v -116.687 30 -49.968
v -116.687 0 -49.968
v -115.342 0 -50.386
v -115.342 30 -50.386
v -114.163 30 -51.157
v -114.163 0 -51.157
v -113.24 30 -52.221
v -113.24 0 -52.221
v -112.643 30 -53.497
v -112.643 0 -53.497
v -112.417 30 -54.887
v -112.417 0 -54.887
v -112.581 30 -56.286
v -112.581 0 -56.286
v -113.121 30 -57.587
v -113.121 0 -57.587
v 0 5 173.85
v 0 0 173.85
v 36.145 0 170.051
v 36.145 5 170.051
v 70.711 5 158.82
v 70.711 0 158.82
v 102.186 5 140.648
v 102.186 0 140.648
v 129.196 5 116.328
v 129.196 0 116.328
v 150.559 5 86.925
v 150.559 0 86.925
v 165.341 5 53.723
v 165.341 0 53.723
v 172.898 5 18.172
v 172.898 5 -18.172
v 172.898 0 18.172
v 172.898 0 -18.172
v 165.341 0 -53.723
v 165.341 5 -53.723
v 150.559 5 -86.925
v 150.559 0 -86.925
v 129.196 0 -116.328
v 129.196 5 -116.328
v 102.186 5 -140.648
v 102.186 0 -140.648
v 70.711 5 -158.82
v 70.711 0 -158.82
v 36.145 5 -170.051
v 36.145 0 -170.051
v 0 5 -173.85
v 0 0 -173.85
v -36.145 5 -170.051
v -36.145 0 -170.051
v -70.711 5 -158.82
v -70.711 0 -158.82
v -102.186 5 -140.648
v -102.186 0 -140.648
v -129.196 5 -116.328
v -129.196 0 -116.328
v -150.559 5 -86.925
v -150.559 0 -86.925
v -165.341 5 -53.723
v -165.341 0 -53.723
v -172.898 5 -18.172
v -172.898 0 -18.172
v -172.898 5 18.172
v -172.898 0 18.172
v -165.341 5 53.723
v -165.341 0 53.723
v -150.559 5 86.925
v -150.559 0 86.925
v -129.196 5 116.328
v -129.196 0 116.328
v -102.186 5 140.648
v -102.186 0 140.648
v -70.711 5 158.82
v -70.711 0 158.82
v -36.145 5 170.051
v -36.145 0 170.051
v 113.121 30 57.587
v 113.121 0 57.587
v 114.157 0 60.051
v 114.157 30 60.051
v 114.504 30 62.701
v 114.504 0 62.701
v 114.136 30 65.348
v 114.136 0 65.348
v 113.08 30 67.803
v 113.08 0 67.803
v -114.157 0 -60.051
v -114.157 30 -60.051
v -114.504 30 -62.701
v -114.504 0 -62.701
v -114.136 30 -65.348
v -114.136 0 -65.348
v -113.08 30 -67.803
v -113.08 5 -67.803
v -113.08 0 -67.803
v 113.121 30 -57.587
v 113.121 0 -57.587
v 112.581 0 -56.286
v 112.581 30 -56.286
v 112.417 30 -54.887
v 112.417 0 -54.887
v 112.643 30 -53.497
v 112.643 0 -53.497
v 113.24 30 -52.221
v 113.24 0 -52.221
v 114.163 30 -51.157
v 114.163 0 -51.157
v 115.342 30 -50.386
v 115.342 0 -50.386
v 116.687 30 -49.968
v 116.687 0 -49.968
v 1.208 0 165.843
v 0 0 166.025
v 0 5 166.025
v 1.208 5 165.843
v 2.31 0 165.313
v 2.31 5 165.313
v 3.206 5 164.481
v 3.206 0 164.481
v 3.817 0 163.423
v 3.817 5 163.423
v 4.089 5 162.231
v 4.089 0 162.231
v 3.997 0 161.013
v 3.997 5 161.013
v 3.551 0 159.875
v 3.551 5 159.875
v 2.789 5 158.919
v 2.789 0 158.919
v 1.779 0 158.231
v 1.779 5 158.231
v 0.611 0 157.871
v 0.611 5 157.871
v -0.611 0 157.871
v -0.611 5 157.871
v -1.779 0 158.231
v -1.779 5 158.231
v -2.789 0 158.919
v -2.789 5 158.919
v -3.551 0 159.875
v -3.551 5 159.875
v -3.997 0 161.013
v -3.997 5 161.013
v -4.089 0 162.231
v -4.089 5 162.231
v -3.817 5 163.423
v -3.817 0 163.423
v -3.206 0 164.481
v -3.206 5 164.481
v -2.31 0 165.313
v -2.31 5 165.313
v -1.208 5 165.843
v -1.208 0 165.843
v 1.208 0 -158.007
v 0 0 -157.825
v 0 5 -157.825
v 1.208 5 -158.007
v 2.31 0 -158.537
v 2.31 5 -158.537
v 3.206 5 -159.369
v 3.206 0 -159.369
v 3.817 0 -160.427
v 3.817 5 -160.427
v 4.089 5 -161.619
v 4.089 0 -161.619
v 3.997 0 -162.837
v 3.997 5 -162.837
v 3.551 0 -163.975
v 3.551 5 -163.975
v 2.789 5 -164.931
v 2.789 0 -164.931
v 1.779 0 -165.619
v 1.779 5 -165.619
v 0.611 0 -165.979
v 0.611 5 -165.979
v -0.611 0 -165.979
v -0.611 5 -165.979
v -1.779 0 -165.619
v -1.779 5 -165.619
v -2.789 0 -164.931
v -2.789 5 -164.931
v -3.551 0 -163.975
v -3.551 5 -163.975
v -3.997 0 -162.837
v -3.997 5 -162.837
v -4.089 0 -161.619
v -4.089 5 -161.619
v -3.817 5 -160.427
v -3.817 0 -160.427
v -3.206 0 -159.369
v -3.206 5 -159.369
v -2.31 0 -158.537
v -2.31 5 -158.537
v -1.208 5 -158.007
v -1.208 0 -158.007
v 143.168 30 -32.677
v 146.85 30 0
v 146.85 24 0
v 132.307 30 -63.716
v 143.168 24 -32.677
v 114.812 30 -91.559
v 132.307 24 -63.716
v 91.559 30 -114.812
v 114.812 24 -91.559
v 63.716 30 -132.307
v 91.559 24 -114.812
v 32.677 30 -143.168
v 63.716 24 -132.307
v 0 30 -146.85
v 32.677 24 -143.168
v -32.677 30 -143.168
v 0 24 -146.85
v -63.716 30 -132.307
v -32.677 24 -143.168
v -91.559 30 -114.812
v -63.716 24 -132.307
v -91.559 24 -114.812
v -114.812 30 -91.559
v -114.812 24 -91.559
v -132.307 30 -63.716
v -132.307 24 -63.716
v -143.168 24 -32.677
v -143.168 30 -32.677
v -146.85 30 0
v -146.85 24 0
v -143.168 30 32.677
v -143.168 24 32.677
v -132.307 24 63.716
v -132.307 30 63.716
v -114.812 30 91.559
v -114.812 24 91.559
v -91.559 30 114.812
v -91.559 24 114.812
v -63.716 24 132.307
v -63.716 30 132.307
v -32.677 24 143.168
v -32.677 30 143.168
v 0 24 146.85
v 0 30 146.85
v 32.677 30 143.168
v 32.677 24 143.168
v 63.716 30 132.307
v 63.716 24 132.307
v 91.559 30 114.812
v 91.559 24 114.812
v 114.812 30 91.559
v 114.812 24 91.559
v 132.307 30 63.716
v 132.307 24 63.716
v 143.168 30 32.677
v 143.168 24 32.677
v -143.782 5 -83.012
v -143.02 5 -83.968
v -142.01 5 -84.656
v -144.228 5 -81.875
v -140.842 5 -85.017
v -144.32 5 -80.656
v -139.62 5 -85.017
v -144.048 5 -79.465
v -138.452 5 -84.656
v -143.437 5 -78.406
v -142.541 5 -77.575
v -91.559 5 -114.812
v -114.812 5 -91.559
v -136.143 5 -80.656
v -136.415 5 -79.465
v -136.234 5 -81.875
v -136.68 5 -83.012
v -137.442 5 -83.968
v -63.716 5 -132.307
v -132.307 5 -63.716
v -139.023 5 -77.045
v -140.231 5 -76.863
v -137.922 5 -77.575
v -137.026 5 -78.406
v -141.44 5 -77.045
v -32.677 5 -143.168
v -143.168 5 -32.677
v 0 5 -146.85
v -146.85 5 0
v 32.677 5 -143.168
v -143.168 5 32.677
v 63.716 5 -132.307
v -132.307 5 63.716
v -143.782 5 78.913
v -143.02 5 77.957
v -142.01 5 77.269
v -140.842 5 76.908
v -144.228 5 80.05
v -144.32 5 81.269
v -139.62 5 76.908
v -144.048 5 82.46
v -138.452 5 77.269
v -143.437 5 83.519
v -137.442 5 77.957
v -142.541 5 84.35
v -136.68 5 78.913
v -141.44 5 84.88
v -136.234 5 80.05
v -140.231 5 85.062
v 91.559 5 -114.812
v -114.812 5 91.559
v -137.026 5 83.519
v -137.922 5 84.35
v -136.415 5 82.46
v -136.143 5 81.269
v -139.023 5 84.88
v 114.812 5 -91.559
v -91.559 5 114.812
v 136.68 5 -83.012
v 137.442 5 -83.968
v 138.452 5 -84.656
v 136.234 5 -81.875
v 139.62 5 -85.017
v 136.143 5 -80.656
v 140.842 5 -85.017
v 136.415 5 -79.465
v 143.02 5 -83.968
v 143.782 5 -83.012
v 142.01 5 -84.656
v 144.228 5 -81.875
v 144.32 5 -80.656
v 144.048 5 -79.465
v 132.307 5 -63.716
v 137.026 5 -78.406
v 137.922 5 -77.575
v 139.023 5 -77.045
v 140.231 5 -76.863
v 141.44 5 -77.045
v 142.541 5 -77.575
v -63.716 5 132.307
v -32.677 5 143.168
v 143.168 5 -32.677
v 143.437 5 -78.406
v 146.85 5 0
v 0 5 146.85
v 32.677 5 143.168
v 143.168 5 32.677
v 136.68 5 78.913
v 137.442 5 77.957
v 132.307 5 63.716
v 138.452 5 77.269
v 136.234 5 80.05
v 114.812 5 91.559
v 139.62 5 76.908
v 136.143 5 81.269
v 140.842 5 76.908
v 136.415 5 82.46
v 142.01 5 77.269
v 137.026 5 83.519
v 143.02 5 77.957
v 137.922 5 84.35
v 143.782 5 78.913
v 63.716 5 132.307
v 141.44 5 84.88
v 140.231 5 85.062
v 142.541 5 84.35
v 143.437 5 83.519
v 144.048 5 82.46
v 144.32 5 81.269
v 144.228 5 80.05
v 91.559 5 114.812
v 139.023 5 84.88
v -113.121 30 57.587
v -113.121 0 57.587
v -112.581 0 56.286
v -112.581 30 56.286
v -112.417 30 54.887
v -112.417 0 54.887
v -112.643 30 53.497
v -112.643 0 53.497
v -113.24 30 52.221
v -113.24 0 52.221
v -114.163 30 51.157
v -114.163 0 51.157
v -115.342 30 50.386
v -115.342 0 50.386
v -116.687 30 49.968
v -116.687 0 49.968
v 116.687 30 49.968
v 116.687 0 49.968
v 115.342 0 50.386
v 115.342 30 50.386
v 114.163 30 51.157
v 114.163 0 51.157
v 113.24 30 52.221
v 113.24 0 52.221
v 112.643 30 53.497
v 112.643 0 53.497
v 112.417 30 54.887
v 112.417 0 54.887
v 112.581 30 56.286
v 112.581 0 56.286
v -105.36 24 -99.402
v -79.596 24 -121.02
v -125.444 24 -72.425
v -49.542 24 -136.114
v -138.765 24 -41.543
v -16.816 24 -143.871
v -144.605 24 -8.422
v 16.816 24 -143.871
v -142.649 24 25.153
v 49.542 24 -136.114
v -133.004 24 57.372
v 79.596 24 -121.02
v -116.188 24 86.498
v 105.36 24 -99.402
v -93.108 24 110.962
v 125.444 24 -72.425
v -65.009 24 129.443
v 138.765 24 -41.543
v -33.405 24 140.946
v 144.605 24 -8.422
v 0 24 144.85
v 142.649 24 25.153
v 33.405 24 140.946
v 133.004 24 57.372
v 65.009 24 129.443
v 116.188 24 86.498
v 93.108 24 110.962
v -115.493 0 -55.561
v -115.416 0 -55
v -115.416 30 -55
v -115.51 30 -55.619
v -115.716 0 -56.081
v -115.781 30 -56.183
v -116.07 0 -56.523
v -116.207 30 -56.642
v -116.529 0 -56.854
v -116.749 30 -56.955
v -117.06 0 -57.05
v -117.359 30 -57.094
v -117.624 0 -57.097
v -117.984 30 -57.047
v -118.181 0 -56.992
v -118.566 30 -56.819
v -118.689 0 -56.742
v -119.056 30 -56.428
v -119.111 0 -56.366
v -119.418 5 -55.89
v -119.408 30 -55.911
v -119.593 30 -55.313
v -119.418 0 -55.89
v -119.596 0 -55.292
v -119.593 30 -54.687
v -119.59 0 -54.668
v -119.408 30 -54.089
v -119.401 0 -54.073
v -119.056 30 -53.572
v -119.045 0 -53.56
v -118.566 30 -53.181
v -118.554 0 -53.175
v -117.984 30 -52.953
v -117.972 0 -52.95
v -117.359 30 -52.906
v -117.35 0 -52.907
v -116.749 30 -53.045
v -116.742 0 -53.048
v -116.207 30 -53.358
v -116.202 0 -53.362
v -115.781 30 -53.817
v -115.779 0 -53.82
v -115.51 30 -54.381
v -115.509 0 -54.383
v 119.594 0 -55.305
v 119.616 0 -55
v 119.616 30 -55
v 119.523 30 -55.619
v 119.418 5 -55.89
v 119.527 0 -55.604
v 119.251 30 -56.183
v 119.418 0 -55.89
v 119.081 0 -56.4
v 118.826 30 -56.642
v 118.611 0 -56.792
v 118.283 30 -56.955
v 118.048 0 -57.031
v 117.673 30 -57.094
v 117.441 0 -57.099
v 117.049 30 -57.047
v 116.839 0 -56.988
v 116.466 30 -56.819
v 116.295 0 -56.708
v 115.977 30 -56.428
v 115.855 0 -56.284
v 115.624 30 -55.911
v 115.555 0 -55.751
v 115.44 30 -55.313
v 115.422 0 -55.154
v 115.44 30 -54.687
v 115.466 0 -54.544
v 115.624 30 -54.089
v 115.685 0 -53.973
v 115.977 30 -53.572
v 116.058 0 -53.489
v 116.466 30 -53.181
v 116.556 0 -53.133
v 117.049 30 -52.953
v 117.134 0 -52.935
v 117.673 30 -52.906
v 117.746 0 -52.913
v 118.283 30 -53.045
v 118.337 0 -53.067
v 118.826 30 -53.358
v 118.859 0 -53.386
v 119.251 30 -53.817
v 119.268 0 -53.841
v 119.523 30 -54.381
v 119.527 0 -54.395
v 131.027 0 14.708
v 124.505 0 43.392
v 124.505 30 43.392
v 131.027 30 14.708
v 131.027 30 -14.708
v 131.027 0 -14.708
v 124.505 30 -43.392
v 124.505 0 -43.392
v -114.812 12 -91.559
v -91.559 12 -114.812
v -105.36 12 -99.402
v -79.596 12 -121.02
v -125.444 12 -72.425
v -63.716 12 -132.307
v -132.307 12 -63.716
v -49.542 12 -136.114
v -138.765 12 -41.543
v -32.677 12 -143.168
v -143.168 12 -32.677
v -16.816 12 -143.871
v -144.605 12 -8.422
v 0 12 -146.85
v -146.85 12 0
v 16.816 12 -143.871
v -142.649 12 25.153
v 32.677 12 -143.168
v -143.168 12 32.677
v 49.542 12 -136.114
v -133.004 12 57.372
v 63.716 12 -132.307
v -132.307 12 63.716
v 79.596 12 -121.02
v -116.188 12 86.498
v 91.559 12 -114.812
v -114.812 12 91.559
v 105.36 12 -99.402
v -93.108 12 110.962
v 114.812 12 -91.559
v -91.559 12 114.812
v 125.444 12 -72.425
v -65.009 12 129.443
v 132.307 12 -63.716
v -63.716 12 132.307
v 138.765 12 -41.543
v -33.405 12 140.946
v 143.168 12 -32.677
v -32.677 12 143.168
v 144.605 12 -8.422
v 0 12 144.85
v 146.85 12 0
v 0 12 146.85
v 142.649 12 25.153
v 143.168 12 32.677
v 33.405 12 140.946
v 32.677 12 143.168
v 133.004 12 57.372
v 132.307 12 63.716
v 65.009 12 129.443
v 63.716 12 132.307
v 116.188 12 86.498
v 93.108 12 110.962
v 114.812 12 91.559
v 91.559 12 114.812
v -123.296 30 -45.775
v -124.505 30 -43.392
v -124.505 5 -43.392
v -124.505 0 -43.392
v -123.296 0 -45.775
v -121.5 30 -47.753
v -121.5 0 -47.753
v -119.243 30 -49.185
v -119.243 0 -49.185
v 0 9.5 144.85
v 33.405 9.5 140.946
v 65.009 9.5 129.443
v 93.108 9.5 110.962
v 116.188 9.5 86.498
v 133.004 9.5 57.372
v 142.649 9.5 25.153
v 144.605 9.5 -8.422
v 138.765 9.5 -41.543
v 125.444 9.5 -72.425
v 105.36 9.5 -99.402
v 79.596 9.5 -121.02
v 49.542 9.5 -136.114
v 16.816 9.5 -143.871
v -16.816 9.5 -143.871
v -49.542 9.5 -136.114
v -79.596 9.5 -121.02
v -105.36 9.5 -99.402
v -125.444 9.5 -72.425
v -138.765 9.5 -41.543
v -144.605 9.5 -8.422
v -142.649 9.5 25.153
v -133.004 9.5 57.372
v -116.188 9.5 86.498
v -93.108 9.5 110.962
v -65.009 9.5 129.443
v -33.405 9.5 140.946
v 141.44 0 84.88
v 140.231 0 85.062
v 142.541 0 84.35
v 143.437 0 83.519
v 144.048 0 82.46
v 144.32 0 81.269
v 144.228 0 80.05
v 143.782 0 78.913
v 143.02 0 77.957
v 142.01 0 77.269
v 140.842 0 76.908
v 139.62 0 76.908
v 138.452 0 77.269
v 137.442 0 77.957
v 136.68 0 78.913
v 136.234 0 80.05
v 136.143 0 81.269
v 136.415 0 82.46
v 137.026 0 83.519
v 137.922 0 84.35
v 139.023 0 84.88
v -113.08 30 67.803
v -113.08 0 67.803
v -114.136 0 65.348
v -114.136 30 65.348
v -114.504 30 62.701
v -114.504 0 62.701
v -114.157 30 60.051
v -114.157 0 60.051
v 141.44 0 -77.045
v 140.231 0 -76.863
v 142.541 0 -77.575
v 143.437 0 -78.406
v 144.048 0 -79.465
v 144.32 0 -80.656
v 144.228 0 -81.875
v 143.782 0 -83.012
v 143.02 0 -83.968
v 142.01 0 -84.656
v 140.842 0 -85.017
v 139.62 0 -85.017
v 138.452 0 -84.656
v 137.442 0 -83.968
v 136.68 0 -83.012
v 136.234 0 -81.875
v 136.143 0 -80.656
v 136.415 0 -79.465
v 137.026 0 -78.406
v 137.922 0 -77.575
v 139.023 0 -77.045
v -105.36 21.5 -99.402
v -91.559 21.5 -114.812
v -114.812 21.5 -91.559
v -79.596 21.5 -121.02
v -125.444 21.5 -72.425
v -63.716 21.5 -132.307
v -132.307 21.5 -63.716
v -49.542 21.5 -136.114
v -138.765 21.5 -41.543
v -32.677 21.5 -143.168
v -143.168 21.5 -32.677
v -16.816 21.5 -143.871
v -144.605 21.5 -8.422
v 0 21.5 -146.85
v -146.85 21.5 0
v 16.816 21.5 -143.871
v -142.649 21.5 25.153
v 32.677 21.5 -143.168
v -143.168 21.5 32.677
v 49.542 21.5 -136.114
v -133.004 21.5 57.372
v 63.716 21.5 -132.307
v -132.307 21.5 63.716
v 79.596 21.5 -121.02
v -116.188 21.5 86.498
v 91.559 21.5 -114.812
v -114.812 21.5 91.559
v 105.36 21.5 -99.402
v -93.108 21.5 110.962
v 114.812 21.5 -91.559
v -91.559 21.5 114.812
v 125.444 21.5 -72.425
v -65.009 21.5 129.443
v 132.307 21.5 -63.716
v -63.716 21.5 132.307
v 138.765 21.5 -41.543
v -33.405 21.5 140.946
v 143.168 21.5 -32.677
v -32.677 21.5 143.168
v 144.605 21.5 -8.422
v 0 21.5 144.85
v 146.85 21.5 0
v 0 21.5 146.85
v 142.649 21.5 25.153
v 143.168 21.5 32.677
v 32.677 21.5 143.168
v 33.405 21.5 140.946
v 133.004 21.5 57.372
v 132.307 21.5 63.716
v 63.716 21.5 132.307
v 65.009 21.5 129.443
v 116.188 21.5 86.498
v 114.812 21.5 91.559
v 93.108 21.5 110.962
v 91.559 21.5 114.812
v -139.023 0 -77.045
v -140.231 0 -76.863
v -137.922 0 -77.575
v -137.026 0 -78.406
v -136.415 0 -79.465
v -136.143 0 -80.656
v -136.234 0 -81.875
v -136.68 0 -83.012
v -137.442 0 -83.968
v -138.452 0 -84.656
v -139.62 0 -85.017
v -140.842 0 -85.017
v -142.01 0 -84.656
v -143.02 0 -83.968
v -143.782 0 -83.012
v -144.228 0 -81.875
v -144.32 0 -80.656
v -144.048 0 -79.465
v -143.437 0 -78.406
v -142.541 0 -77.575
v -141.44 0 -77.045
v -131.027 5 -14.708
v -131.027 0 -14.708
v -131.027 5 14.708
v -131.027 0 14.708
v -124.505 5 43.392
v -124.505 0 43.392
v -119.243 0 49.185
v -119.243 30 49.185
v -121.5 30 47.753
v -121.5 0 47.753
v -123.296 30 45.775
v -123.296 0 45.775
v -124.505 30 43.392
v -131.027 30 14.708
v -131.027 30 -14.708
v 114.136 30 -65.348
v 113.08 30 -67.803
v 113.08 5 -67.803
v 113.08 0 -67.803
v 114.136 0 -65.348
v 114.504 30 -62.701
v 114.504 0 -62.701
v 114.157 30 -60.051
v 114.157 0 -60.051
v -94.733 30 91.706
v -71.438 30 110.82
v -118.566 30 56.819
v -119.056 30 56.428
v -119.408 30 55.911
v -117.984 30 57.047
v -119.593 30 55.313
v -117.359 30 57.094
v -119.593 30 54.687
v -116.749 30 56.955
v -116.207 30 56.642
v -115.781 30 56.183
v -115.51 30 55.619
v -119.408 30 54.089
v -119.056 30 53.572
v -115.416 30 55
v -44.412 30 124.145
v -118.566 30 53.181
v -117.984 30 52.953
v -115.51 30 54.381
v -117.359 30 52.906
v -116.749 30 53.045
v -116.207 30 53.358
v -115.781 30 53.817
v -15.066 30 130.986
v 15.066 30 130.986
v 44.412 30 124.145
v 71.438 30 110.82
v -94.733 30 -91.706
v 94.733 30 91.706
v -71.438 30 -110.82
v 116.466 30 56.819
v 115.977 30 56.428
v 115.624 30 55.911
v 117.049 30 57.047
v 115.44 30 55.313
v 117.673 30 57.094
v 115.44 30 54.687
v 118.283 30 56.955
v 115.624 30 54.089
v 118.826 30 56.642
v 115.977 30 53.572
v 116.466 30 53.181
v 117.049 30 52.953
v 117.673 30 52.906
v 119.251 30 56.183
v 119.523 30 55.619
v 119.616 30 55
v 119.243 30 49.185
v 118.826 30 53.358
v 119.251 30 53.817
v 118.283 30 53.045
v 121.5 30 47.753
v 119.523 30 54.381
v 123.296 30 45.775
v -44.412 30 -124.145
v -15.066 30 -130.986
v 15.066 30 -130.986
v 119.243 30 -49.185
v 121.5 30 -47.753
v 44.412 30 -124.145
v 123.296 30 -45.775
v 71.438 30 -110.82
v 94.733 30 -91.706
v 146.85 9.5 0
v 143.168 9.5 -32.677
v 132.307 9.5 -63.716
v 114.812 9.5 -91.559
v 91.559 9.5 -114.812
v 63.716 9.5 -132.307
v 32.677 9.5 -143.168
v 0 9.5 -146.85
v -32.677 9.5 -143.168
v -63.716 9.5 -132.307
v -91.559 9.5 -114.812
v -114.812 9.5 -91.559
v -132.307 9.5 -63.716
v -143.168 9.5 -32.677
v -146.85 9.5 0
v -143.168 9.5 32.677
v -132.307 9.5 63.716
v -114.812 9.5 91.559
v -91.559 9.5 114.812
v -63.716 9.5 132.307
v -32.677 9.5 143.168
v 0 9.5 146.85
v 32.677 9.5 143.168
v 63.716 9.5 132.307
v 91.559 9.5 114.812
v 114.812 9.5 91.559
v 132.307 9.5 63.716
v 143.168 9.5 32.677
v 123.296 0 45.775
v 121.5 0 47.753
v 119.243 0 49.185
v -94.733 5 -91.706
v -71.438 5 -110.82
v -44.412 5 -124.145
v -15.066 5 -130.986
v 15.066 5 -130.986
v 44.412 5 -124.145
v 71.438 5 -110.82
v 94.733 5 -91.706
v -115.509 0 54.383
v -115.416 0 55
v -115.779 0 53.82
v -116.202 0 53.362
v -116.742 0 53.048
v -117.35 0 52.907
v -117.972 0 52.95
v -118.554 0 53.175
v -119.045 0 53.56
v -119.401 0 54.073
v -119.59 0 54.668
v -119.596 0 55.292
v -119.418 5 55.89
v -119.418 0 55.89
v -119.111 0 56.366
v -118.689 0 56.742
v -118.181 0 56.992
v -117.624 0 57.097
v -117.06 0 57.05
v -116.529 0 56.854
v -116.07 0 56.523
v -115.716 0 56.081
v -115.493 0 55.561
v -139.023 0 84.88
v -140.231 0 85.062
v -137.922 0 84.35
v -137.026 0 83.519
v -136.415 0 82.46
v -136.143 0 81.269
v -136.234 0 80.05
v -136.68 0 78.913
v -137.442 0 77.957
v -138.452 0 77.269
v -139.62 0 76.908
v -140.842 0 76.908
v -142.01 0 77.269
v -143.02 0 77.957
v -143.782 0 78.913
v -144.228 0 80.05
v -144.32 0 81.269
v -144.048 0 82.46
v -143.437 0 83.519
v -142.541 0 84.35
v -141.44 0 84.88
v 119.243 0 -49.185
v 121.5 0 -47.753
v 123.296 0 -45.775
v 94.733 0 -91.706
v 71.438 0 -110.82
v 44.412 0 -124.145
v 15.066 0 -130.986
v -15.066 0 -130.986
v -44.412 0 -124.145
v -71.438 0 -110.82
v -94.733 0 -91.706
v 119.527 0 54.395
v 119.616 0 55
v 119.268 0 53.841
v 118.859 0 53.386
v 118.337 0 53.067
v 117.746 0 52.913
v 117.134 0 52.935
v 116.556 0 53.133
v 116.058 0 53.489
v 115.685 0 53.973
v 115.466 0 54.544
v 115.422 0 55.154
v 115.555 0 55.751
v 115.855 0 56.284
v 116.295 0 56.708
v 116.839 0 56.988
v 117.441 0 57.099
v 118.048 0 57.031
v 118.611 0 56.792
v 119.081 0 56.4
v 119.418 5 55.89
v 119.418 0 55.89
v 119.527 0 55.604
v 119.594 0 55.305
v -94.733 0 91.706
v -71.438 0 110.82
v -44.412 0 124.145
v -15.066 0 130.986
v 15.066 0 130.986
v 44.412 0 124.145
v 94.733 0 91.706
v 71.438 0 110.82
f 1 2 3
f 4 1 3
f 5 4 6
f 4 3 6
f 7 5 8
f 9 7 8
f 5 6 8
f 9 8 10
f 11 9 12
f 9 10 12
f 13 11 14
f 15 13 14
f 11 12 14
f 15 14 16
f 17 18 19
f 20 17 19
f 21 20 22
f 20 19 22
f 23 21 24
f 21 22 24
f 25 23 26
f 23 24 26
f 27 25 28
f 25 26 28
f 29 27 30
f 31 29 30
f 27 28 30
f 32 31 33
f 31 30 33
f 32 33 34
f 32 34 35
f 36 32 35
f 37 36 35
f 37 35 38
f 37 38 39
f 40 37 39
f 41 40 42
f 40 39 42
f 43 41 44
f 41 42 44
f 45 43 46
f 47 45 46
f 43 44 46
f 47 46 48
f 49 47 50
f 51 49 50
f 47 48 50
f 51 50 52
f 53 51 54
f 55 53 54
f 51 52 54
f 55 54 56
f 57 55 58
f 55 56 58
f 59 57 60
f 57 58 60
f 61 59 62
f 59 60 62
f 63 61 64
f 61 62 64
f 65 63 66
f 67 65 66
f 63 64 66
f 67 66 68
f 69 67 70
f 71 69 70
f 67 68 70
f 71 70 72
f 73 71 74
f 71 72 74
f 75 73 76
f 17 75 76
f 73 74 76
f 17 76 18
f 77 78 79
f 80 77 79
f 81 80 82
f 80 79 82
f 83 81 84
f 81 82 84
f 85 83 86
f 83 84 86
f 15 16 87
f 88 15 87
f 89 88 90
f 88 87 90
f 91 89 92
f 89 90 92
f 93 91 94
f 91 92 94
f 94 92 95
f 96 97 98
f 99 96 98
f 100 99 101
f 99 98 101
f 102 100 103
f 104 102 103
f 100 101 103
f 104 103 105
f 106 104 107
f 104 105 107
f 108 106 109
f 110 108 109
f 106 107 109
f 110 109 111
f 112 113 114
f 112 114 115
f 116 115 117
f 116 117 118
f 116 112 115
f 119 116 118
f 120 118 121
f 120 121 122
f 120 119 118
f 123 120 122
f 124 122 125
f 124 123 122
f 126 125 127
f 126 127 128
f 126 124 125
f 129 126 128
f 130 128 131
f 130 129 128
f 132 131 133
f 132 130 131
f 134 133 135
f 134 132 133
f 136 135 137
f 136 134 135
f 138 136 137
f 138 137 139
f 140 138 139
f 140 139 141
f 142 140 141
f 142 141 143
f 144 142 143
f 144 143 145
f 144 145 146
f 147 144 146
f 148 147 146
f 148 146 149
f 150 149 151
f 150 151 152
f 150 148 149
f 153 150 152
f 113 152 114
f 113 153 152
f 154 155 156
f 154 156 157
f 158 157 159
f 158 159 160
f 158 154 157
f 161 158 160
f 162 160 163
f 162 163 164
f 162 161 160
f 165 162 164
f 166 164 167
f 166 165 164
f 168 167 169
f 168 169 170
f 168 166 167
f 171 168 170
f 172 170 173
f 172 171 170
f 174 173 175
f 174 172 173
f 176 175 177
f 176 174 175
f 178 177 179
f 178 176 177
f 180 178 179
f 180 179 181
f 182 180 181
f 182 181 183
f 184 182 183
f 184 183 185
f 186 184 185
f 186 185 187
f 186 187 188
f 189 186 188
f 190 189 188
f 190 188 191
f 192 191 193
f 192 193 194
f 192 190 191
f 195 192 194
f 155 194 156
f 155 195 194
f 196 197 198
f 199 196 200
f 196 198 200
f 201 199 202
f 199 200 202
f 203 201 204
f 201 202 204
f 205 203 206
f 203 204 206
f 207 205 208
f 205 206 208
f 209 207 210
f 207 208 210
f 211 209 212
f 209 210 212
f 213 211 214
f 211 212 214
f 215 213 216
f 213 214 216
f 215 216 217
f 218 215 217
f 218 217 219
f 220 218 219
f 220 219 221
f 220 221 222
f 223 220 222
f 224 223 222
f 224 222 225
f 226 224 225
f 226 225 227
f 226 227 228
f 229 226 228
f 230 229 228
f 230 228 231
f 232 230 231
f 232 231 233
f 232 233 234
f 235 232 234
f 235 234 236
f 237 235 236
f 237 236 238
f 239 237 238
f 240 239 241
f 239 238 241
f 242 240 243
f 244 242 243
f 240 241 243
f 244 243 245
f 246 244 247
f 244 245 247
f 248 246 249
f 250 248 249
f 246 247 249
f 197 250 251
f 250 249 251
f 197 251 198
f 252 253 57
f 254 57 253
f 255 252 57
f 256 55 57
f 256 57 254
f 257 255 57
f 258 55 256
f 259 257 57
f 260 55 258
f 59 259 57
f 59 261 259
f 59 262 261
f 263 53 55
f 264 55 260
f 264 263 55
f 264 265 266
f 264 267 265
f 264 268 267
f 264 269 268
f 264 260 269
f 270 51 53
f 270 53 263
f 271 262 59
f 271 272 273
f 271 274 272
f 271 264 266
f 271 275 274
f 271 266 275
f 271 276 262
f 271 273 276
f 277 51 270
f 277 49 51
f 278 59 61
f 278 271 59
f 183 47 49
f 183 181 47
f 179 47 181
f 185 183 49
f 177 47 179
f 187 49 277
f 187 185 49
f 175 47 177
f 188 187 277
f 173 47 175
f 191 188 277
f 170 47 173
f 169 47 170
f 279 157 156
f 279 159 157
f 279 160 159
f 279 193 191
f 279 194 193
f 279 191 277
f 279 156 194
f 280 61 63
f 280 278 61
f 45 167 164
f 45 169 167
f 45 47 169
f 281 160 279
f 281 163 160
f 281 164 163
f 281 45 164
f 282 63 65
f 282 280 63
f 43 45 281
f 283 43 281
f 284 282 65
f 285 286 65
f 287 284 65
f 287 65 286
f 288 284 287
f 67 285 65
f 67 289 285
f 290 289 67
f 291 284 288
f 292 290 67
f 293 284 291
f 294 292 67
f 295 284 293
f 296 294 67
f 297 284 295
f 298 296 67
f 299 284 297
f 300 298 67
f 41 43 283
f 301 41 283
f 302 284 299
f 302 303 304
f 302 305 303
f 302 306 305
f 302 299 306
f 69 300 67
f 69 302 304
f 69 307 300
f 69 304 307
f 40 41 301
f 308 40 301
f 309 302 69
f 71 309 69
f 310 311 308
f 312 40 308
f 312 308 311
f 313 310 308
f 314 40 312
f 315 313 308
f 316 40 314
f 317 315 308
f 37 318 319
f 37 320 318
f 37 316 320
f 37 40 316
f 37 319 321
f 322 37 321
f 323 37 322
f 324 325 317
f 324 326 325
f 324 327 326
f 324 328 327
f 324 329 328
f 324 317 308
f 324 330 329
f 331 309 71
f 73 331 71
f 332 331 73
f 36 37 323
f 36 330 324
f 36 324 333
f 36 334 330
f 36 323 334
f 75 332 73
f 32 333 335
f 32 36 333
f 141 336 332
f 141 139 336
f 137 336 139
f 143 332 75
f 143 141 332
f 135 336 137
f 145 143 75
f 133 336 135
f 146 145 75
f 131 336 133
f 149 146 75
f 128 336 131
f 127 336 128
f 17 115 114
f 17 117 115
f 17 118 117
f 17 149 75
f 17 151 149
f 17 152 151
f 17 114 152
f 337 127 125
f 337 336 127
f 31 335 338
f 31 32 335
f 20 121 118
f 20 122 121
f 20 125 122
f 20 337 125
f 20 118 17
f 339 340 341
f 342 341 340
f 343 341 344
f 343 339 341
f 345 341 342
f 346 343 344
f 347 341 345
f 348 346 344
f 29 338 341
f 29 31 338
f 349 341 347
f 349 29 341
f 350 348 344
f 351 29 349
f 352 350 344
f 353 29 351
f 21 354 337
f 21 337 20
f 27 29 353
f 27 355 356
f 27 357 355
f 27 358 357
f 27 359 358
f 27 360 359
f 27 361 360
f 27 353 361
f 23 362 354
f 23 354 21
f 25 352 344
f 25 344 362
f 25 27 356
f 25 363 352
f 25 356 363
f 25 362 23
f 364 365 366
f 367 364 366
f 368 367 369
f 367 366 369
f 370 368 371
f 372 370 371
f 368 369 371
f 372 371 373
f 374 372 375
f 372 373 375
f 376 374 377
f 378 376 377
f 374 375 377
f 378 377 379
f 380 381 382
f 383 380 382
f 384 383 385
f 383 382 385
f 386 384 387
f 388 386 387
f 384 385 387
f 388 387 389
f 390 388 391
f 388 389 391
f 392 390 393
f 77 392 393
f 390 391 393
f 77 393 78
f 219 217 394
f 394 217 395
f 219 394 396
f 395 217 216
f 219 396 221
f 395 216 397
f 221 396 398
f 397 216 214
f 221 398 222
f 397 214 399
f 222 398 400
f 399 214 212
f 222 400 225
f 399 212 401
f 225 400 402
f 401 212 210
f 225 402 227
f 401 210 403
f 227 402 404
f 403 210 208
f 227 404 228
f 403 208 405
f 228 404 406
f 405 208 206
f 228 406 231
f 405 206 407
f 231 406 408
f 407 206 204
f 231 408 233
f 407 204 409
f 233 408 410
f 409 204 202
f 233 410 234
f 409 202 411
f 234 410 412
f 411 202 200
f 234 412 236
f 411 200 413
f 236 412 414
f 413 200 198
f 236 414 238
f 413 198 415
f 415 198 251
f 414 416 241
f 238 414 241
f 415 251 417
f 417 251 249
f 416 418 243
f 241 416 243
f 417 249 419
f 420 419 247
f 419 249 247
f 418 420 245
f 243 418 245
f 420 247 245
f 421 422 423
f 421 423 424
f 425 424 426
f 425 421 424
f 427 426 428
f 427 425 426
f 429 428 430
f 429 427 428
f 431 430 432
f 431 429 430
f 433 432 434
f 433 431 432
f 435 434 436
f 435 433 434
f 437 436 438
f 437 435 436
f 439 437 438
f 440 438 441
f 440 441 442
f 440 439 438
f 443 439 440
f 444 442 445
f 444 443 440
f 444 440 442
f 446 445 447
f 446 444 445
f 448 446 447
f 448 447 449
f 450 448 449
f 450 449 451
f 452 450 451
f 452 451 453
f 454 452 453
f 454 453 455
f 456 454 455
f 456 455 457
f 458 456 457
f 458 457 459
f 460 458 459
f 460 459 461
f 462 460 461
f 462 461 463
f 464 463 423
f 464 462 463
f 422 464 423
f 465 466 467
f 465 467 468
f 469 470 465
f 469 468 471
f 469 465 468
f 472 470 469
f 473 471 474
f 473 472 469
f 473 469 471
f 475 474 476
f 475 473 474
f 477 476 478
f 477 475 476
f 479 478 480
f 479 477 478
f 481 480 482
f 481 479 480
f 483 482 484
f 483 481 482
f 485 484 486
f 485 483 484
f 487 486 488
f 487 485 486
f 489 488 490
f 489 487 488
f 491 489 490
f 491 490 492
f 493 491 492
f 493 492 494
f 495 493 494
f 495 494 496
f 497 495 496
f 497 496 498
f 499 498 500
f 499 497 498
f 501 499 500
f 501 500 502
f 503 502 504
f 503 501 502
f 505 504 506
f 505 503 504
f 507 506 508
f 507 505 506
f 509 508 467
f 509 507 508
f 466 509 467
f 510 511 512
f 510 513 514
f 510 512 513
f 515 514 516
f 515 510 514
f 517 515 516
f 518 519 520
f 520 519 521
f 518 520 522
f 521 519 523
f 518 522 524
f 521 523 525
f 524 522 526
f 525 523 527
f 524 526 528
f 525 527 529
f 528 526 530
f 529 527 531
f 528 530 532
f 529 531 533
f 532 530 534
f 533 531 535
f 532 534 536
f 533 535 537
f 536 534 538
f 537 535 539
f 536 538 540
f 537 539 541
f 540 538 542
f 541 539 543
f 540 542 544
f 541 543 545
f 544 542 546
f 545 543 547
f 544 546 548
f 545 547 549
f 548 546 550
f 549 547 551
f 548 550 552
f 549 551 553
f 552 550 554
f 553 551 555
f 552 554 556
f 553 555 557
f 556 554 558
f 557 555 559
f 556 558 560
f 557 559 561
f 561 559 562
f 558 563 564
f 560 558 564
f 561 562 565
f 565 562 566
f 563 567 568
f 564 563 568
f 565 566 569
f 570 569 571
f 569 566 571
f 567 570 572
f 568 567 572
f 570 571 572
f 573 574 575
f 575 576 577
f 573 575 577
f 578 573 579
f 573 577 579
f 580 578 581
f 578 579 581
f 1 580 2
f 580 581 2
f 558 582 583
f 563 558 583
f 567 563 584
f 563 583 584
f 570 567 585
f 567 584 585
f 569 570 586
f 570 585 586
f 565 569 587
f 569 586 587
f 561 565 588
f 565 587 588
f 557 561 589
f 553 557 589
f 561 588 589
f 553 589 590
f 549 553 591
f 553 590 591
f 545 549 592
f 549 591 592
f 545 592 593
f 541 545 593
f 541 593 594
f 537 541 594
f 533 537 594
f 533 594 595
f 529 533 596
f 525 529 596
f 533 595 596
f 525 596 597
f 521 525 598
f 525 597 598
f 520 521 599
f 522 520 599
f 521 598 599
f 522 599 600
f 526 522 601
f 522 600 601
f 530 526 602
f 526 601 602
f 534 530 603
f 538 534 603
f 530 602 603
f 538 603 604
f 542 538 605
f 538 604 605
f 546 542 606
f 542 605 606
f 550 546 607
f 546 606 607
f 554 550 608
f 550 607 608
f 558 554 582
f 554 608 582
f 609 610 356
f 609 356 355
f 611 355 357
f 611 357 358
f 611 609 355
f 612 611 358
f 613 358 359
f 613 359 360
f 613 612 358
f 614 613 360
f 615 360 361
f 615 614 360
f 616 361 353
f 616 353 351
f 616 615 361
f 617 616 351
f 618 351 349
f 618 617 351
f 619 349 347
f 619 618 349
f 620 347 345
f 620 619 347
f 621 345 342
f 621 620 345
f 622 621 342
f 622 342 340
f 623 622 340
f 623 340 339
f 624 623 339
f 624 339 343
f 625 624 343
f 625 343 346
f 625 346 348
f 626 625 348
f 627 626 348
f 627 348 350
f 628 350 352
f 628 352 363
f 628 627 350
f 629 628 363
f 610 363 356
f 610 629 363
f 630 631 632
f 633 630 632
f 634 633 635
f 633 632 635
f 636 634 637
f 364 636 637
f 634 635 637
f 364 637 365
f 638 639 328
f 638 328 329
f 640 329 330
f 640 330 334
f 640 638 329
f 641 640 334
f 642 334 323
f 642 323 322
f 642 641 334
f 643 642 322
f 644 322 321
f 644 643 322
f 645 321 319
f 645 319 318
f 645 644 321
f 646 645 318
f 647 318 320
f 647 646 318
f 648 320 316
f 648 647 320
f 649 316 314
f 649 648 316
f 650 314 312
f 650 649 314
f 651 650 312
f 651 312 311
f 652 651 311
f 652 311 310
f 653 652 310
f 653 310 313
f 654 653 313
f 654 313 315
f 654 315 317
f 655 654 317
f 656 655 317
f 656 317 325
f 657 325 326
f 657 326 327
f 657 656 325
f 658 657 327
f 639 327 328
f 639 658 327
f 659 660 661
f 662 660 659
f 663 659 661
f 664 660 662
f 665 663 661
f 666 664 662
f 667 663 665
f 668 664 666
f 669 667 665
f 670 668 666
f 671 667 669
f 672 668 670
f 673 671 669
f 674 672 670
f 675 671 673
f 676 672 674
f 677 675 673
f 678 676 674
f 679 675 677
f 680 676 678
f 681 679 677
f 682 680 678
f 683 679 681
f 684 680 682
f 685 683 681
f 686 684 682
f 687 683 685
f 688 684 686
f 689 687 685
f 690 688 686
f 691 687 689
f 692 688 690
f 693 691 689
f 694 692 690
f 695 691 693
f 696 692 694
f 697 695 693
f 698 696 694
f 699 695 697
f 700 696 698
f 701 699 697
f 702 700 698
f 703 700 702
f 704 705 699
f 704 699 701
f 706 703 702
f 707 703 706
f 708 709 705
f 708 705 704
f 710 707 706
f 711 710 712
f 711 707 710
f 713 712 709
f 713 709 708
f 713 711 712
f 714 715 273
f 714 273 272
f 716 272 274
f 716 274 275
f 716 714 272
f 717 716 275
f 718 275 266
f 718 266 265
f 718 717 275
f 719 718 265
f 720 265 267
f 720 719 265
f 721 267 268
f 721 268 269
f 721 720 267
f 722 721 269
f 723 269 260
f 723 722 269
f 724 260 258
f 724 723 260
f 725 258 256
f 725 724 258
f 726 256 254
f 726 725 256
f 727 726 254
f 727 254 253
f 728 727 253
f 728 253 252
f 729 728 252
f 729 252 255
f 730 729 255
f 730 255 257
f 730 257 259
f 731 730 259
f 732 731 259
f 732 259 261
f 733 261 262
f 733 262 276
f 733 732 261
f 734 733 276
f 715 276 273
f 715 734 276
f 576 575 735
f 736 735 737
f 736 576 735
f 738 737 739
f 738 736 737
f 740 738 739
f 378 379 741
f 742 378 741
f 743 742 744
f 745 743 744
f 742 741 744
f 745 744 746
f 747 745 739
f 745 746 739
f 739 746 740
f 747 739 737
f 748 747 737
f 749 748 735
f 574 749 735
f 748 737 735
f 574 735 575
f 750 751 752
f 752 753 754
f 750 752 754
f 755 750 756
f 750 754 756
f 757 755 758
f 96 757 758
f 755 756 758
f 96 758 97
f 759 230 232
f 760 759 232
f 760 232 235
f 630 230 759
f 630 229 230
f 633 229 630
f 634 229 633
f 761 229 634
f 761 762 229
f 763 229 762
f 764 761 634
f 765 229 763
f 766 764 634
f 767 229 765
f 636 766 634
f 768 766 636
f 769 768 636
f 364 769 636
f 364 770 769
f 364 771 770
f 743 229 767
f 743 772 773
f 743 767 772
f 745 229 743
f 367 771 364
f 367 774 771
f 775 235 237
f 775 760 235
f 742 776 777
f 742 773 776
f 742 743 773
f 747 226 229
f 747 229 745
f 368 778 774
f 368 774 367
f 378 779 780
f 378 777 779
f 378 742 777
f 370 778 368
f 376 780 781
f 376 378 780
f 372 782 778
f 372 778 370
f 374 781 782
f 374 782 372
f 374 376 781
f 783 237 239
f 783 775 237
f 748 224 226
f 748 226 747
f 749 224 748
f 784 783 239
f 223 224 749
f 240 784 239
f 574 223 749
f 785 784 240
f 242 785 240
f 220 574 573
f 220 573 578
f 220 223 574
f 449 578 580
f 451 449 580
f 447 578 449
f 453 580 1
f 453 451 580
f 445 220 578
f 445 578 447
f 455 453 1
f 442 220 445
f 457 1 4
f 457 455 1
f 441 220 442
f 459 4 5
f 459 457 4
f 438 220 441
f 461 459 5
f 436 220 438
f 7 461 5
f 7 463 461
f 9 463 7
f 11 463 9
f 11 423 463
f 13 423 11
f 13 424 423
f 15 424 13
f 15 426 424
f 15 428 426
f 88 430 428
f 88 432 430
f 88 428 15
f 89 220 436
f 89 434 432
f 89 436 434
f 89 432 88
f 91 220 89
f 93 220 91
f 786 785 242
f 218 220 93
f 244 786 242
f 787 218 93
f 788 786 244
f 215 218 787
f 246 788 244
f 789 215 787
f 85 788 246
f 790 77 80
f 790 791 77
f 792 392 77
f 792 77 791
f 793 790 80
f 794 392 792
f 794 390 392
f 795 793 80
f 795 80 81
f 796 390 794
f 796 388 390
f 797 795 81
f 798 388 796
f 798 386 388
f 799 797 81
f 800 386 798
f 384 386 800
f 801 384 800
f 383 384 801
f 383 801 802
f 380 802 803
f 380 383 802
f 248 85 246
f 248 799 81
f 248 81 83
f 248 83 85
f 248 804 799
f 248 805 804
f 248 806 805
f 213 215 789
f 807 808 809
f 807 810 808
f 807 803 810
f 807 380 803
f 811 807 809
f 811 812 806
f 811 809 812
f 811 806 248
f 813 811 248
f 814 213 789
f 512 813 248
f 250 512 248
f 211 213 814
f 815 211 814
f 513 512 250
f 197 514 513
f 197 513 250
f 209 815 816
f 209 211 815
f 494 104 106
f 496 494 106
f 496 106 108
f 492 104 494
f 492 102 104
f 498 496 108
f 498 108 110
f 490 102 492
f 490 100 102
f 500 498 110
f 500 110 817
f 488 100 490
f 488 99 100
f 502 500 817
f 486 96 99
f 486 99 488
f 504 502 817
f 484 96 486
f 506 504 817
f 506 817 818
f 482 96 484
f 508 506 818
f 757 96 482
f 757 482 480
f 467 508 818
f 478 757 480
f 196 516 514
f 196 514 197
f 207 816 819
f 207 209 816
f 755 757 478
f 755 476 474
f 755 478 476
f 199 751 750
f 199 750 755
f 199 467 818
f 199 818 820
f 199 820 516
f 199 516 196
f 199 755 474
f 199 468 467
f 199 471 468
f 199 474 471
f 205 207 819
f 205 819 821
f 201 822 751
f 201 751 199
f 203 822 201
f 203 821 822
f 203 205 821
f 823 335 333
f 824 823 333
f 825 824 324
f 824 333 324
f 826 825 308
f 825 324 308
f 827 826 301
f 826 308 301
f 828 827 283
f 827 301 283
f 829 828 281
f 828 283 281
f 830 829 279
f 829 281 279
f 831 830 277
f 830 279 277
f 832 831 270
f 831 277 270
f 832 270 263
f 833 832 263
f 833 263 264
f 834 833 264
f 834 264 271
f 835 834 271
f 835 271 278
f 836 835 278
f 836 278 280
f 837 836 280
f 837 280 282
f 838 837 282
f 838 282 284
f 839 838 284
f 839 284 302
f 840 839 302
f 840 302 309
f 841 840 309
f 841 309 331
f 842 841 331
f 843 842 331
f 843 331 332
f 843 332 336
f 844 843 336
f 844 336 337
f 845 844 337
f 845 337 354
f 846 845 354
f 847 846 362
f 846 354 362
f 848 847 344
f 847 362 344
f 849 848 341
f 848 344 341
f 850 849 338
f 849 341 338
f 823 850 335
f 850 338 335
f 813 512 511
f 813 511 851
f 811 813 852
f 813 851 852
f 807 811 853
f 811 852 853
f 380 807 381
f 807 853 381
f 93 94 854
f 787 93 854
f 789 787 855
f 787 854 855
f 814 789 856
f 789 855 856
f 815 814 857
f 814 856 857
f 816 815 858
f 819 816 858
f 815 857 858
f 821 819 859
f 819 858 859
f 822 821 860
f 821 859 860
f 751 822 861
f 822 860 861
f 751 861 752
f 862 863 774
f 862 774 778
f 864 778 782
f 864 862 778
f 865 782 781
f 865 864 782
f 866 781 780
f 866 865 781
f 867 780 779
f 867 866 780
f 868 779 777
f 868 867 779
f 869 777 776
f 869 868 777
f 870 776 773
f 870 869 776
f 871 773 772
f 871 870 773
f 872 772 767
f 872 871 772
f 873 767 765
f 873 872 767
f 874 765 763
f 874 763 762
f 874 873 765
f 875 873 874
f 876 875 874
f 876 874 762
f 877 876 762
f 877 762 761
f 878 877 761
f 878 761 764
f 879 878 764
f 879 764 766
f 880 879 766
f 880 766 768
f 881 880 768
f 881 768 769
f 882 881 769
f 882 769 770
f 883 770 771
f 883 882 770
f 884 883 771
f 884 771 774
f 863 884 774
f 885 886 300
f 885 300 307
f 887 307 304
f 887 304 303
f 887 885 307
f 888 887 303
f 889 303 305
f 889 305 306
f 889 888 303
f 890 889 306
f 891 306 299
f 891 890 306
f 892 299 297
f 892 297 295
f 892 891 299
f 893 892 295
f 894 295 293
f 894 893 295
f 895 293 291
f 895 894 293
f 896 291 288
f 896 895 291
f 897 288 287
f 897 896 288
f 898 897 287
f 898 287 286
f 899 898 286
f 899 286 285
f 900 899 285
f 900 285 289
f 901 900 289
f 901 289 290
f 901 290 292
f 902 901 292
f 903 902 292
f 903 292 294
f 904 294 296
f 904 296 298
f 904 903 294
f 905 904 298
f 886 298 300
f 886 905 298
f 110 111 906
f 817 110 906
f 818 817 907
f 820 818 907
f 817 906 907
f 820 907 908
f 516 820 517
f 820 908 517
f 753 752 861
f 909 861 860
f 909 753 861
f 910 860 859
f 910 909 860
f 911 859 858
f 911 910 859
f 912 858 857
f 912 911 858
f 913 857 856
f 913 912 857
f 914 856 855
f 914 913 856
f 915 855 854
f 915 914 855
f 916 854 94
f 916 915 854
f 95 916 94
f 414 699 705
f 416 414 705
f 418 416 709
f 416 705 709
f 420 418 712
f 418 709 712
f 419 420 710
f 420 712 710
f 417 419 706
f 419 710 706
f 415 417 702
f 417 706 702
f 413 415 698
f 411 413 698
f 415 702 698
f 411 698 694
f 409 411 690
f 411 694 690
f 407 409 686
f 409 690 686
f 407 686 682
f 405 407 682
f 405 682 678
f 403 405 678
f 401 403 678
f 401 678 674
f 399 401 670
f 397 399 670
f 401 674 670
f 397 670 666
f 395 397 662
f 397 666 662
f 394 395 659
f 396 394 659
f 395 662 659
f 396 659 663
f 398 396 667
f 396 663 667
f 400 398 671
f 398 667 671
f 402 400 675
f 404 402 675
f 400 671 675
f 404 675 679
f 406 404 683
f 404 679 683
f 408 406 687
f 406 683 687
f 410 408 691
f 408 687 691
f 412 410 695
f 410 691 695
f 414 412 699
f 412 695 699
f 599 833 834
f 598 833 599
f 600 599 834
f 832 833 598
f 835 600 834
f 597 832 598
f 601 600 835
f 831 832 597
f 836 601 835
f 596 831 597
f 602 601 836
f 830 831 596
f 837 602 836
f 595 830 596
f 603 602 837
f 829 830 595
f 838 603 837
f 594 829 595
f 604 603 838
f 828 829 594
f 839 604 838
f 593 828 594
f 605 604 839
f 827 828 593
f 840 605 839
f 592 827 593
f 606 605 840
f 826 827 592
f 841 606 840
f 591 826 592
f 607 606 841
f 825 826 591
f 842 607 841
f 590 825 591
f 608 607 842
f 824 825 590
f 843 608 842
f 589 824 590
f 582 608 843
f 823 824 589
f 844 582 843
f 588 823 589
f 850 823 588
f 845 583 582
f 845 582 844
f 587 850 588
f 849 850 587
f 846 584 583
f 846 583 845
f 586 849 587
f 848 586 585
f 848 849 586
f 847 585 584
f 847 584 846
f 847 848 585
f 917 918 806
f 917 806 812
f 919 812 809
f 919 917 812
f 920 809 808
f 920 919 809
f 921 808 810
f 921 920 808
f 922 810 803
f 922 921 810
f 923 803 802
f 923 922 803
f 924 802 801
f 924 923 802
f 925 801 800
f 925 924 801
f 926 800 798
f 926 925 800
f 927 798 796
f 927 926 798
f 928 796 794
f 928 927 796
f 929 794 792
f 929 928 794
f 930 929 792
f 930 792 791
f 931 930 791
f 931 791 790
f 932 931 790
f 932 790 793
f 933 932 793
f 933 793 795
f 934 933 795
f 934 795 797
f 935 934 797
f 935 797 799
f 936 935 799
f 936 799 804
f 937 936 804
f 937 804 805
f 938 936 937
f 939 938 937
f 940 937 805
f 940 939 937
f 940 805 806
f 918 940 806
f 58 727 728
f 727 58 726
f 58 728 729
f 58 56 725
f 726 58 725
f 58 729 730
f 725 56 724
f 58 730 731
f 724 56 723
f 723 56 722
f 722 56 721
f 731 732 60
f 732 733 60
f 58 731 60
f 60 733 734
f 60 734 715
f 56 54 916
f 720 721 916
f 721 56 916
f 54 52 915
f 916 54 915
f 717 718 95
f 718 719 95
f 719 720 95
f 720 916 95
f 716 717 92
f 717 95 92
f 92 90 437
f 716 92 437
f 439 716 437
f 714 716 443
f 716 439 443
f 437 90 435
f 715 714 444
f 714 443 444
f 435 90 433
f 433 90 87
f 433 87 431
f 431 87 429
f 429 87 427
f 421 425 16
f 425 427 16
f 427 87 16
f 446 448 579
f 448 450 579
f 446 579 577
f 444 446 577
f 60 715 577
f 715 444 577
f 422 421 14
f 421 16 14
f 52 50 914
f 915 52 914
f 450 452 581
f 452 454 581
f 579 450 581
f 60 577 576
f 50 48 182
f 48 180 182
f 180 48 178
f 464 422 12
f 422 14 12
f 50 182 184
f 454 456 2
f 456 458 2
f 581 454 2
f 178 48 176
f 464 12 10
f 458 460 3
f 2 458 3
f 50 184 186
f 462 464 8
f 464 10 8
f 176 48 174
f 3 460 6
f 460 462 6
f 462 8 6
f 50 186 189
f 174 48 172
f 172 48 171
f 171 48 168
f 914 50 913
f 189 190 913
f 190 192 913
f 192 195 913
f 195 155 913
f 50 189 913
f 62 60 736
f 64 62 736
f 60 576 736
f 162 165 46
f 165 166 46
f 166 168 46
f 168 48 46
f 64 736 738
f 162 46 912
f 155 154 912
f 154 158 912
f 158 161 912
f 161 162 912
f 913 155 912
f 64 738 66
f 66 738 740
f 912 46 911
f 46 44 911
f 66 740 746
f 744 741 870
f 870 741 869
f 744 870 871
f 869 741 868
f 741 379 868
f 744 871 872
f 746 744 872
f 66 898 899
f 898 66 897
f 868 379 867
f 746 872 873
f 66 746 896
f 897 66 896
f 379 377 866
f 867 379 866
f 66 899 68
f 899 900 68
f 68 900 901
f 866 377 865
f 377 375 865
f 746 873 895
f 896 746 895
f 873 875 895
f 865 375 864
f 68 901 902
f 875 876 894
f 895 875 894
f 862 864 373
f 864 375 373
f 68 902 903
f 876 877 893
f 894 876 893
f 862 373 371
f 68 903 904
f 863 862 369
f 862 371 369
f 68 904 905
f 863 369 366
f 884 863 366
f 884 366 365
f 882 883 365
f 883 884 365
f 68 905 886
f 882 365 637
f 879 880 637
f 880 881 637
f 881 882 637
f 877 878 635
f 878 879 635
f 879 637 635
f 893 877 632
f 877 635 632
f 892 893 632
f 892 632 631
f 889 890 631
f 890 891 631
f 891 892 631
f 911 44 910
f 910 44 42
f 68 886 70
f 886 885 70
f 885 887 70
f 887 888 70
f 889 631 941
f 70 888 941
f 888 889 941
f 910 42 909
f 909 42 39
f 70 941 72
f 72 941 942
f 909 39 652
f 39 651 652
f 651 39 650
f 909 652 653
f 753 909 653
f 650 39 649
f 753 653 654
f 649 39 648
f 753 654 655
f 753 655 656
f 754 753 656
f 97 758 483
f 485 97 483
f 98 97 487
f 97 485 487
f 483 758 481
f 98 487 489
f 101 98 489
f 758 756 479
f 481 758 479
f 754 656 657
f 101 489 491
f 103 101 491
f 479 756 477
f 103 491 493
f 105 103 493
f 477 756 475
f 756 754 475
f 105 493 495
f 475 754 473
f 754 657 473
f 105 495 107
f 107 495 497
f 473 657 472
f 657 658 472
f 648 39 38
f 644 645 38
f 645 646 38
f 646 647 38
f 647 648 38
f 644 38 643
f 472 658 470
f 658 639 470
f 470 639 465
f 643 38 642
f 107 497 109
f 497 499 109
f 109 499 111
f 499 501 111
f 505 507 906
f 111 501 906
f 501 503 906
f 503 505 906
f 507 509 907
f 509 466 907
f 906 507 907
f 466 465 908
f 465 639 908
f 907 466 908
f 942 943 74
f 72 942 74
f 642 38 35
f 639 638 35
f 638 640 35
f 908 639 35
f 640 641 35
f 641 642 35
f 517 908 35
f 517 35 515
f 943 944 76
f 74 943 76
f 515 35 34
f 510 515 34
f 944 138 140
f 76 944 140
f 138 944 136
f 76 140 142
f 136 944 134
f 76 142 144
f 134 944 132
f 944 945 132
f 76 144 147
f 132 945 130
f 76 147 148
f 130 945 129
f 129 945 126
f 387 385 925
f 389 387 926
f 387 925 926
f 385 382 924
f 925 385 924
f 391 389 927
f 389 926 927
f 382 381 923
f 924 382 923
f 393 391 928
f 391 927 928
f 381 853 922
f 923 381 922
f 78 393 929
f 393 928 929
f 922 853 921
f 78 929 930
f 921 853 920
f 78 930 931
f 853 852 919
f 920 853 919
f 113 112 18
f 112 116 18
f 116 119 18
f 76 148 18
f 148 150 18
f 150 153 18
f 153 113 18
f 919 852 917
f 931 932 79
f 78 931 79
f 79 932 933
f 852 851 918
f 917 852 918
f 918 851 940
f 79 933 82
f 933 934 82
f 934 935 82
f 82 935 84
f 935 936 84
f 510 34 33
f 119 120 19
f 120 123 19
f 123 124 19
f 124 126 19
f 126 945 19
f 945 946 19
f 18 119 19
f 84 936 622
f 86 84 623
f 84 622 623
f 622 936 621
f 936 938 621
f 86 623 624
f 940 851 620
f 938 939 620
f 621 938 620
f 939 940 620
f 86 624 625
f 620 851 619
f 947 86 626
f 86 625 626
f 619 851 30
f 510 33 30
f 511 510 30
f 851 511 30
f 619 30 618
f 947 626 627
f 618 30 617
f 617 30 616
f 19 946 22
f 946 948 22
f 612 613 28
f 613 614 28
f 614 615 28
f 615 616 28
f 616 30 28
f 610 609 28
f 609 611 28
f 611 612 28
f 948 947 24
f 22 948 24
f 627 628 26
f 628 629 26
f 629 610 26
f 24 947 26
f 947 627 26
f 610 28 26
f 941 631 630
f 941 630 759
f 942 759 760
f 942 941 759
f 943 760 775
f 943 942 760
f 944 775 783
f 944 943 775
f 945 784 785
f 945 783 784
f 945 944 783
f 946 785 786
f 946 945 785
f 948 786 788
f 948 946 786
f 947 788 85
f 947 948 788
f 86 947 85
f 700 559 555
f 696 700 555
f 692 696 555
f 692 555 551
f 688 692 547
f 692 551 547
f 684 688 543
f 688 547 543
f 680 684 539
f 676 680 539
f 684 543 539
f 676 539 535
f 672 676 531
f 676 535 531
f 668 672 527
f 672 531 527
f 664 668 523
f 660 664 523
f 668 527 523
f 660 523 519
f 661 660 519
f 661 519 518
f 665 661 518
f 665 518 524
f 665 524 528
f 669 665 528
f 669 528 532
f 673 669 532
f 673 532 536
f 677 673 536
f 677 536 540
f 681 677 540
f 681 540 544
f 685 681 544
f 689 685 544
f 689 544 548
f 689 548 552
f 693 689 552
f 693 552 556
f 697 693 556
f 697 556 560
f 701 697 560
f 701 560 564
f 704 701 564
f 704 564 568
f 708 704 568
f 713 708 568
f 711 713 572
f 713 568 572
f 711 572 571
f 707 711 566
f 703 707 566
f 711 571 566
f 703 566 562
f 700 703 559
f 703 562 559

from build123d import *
from build123d.topology import SkipClean

# Parameters (mm, degrees)
SKETCH1_R           = 173.85
SKETCH1_R_2         = 4.1
SKETCH1_R_3         = 131.85
BOSS_EXTRUDE1_DEPTH = 5
SKETCH1_3_R         = 146.85
SKETCH1_3_R_2       = 2.1
BOSS_EXTRUDE2_DEPTH = 30
CUT_EXTRUDE1_START  = 9.5
SKETCH1_4_R         = 146.85
SKETCH1_4_R_2       = 144.85
CUT_EXTRUDE1_DEPTH  = 2.5
CUT_EXTRUDE2_START  = 21.5
SKETCH1_5_R         = 146.85
SKETCH1_5_R_2       = 144.85
CUT_EXTRUDE2_DEPTH  = 2.5


with BuildPart() as part:
    # Sketch1 → Boss-Extrude1 (new body)
    with BuildSketch(Plane(origin=(0, 0, 0), x_dir=(1, 0, 0), z_dir=(0, 1, 0))):
        Circle(SKETCH1_R)
        with Locations((-140.231163508, -80.9625)):
            Circle(SKETCH1_R_2, mode=Mode.SUBTRACT)
        with Locations((0, -161.925)):
            Circle(SKETCH1_R_2, mode=Mode.SUBTRACT)
        with Locations((140.231163508, -80.9625)):
            Circle(SKETCH1_R_2, mode=Mode.SUBTRACT)
        with Locations((-140.231163508, 80.9625)):
            Circle(SKETCH1_R_2, mode=Mode.SUBTRACT)
        with Locations((0, 161.925)):
            Circle(SKETCH1_R_2, mode=Mode.SUBTRACT)
        with Locations((140.231163508, 80.9625)):
            Circle(SKETCH1_R_2, mode=Mode.SUBTRACT)
        Circle(SKETCH1_R_3, mode=Mode.SUBTRACT)
    extrude(amount=BOSS_EXTRUDE1_DEPTH)

    # Sketch1<3> → Boss-Extrude2 (add)
    with BuildSketch(Plane(origin=(0, 0, 0), x_dir=(1, 0, 0), z_dir=(0, 1, 0))):
        Circle(SKETCH1_3_R)
        with BuildLine():
            ThreePointArc((124.505351616, -43.391703343), (121.499509166, -47.753398598), (116.687446985, -49.967790594))
            ThreePointArc((116.687446985, -49.967790594), (112.897087536, -52.838150289), (113.121306631, -57.587415004))
            ThreePointArc((113.121306631, -57.587415004), (114.503744228, -62.700959824), (113.080257044, -67.803229768))
            ThreePointArc((113.080257044, -67.803229768), (0, -131.85), (-113.080257044, -67.803229768))
            ThreePointArc((-113.080257044, -67.803229768), (-114.503744228, -62.700959824), (-113.121306631, -57.587415004))
            ThreePointArc((-113.121306631, -57.587415004), (-112.897087536, -52.838150289), (-116.687446985, -49.967790594))
            ThreePointArc((-116.687446985, -49.967790594), (-121.499509166, -47.753398598), (-124.505351616, -43.391703343))
            ThreePointArc((-124.505351616, -43.391703343), (-131.85, 0), (-124.505351616, 43.391703343))
            ThreePointArc((-124.505351616, 43.391703343), (-121.499509166, 47.753398598), (-116.687446985, 49.967790594))
            ThreePointArc((-116.687446985, 49.967790594), (-112.897087536, 52.838150289), (-113.121306631, 57.587415004))
            ThreePointArc((-113.121306631, 57.587415004), (-114.503744228, 62.700959824), (-113.080257044, 67.803229768))
            ThreePointArc((-113.080257044, 67.803229768), (0, 131.85), (113.080257044, 67.803229768))
            ThreePointArc((113.080257044, 67.803229768), (114.503744228, 62.700959824), (113.121306631, 57.587415004))
            ThreePointArc((113.121306631, 57.587415004), (112.897087536, 52.838150289), (116.687446985, 49.967790594))
            ThreePointArc((116.687446985, 49.967790594), (121.499509166, 47.753398598), (124.505351616, 43.391703343))
            ThreePointArc((124.505351616, 43.391703343), (131.85, 0), (124.505351616, -43.391703343))
        make_face(mode=Mode.SUBTRACT)
        with Locations((117.516222284, 55)):
            Circle(SKETCH1_3_R_2, mode=Mode.SUBTRACT)
        with Locations((-117.516222284, 55)):
            Circle(SKETCH1_3_R_2, mode=Mode.SUBTRACT)
        with Locations((-117.516222284, -55)):
            Circle(SKETCH1_3_R_2, mode=Mode.SUBTRACT)
        with Locations((117.516222284, -55)):
            Circle(SKETCH1_3_R_2, mode=Mode.SUBTRACT)
    extrude(amount=BOSS_EXTRUDE2_DEPTH)

    # Sketch1<4> → Cut-Extrude1 (cut)
    with SkipClean():  # the faces are left unmerged after this step: merging them gives an invalid solid
        with BuildSketch(Plane(origin=(0, 0, 0), x_dir=(1, 0, 0), z_dir=(0, 1, 0)).offset(CUT_EXTRUDE1_START)):
            Circle(SKETCH1_4_R)
            Circle(SKETCH1_4_R_2, mode=Mode.SUBTRACT)
        extrude(amount=CUT_EXTRUDE1_DEPTH, mode=Mode.SUBTRACT)

    # Sketch1<5> → Cut-Extrude2 (cut)
    with SkipClean():  # the faces are left unmerged after this step: merging them gives an invalid solid
        with BuildSketch(Plane(origin=(0, 0, 0), x_dir=(1, 0, 0), z_dir=(0, 1, 0)).offset(CUT_EXTRUDE2_START)):
            Circle(SKETCH1_5_R)
            Circle(SKETCH1_5_R_2, mode=Mode.SUBTRACT)
        extrude(amount=CUT_EXTRUDE2_DEPTH, mode=Mode.SUBTRACT)


solid = part.part
